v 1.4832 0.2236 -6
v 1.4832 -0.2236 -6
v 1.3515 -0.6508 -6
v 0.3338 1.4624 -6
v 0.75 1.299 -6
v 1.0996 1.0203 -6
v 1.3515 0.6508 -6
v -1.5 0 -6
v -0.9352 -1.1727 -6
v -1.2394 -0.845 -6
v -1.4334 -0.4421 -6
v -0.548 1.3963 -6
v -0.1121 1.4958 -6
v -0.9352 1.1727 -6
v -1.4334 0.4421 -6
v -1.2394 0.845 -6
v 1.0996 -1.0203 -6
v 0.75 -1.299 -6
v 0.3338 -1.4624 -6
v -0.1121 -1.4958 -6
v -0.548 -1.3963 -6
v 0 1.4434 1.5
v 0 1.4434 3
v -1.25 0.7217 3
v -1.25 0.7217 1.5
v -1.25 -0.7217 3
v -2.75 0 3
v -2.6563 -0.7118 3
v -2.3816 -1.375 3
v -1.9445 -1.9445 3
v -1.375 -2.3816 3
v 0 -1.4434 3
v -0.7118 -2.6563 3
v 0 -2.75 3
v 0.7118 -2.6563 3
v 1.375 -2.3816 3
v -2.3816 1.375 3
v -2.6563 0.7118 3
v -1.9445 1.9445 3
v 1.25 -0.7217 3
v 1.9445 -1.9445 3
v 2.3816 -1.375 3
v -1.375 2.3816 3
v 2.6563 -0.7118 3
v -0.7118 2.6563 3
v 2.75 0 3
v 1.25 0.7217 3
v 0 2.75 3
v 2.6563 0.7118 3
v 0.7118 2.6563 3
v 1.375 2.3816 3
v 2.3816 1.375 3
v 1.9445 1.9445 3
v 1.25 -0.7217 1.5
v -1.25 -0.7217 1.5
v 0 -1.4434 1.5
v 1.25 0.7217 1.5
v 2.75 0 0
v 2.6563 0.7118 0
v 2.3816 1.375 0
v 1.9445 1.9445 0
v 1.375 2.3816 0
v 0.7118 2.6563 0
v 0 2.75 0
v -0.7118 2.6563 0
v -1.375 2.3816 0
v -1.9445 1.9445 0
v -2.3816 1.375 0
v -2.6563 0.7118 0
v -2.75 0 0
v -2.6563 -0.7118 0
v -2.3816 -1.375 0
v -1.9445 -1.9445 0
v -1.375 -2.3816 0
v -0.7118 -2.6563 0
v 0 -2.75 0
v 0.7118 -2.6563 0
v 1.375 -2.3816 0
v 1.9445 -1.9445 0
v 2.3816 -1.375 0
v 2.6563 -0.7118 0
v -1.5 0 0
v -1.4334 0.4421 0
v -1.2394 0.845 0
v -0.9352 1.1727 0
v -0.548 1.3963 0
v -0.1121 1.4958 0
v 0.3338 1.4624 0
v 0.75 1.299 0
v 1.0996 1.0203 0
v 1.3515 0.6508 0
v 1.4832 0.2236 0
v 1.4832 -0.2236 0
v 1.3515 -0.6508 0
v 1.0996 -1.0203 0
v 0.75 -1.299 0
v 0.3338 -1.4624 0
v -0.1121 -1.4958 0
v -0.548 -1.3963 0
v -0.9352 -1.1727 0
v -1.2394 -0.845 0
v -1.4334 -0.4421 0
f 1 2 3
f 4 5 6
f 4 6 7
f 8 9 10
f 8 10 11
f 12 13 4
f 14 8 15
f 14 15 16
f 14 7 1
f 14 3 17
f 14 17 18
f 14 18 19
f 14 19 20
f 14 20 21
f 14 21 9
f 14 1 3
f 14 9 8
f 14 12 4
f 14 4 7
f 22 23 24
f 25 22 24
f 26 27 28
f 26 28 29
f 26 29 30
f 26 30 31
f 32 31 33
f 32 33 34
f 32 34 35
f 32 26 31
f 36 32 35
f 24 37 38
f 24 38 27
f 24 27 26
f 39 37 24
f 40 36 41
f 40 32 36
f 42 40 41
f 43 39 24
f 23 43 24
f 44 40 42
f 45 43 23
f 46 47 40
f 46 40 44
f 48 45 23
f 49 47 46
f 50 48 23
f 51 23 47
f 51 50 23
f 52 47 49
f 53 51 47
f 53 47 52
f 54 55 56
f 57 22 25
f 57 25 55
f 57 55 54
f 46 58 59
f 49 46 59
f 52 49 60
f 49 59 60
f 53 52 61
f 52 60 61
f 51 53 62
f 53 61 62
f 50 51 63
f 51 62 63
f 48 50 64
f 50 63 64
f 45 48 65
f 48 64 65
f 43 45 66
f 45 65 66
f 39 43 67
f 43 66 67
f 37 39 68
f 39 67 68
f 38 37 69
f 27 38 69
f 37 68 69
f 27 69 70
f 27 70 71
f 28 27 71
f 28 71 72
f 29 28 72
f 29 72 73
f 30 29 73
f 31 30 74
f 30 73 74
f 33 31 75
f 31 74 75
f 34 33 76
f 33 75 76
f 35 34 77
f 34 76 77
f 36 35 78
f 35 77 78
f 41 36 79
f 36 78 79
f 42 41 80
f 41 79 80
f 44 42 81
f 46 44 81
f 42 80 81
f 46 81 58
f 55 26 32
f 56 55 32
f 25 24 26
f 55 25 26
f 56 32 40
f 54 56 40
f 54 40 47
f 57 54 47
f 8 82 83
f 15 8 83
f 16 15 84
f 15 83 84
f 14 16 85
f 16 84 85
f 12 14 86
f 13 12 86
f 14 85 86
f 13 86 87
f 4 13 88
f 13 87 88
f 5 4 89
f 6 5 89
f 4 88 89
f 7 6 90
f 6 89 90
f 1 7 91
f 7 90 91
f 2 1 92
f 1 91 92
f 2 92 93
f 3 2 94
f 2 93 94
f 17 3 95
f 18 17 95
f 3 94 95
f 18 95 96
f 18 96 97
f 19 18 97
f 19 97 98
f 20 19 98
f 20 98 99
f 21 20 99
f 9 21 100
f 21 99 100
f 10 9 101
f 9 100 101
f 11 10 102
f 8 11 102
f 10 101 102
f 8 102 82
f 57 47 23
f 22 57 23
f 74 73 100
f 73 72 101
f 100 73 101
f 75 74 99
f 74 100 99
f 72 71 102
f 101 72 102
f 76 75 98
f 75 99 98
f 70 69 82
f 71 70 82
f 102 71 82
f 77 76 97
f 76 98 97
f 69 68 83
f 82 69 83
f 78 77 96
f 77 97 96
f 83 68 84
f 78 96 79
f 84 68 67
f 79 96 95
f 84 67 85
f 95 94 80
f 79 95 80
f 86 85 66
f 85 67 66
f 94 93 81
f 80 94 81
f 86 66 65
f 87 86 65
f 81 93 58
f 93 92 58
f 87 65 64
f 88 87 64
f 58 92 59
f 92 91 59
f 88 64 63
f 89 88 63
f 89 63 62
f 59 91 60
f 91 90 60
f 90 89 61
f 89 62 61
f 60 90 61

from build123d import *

# Parameters (mm, degrees)
SKETCH_1_R          = 2.75
EXTRUDE_1_DEPTH     = 3
CUT_EXTRUDE_1_DEPTH = 1.5
SKETCH_3_R          = 1.5
EXTRUDE_2_DEPTH     = 6


with BuildPart() as part:
    # 草图1 → 凸台-拉伸1 (new body)
    with BuildSketch(Plane.XY):
        Circle(SKETCH_1_R)
    extrude(amount=EXTRUDE_1_DEPTH)

    # 草图2 → 切除-拉伸1 (cut)
    with BuildSketch(Plane.XY.offset(3)):
        Polygon((0, -1.443375673), (1.25, -0.721687836), (1.25, 0.721687836), (0, 1.443375673), (-1.25, 0.721687836), (-1.25, -0.721687836), align=None)
    extrude(amount=-CUT_EXTRUDE_1_DEPTH, mode=Mode.SUBTRACT)

    # 草图3 → 凸台-拉伸2 (add)
    with BuildSketch(Plane(origin=(0, 0, 0), x_dir=(-1, 0, 0), z_dir=(0, 0, -1))):
        Circle(SKETCH_3_R)
    extrude(amount=EXTRUDE_2_DEPTH)


solid = part.part
